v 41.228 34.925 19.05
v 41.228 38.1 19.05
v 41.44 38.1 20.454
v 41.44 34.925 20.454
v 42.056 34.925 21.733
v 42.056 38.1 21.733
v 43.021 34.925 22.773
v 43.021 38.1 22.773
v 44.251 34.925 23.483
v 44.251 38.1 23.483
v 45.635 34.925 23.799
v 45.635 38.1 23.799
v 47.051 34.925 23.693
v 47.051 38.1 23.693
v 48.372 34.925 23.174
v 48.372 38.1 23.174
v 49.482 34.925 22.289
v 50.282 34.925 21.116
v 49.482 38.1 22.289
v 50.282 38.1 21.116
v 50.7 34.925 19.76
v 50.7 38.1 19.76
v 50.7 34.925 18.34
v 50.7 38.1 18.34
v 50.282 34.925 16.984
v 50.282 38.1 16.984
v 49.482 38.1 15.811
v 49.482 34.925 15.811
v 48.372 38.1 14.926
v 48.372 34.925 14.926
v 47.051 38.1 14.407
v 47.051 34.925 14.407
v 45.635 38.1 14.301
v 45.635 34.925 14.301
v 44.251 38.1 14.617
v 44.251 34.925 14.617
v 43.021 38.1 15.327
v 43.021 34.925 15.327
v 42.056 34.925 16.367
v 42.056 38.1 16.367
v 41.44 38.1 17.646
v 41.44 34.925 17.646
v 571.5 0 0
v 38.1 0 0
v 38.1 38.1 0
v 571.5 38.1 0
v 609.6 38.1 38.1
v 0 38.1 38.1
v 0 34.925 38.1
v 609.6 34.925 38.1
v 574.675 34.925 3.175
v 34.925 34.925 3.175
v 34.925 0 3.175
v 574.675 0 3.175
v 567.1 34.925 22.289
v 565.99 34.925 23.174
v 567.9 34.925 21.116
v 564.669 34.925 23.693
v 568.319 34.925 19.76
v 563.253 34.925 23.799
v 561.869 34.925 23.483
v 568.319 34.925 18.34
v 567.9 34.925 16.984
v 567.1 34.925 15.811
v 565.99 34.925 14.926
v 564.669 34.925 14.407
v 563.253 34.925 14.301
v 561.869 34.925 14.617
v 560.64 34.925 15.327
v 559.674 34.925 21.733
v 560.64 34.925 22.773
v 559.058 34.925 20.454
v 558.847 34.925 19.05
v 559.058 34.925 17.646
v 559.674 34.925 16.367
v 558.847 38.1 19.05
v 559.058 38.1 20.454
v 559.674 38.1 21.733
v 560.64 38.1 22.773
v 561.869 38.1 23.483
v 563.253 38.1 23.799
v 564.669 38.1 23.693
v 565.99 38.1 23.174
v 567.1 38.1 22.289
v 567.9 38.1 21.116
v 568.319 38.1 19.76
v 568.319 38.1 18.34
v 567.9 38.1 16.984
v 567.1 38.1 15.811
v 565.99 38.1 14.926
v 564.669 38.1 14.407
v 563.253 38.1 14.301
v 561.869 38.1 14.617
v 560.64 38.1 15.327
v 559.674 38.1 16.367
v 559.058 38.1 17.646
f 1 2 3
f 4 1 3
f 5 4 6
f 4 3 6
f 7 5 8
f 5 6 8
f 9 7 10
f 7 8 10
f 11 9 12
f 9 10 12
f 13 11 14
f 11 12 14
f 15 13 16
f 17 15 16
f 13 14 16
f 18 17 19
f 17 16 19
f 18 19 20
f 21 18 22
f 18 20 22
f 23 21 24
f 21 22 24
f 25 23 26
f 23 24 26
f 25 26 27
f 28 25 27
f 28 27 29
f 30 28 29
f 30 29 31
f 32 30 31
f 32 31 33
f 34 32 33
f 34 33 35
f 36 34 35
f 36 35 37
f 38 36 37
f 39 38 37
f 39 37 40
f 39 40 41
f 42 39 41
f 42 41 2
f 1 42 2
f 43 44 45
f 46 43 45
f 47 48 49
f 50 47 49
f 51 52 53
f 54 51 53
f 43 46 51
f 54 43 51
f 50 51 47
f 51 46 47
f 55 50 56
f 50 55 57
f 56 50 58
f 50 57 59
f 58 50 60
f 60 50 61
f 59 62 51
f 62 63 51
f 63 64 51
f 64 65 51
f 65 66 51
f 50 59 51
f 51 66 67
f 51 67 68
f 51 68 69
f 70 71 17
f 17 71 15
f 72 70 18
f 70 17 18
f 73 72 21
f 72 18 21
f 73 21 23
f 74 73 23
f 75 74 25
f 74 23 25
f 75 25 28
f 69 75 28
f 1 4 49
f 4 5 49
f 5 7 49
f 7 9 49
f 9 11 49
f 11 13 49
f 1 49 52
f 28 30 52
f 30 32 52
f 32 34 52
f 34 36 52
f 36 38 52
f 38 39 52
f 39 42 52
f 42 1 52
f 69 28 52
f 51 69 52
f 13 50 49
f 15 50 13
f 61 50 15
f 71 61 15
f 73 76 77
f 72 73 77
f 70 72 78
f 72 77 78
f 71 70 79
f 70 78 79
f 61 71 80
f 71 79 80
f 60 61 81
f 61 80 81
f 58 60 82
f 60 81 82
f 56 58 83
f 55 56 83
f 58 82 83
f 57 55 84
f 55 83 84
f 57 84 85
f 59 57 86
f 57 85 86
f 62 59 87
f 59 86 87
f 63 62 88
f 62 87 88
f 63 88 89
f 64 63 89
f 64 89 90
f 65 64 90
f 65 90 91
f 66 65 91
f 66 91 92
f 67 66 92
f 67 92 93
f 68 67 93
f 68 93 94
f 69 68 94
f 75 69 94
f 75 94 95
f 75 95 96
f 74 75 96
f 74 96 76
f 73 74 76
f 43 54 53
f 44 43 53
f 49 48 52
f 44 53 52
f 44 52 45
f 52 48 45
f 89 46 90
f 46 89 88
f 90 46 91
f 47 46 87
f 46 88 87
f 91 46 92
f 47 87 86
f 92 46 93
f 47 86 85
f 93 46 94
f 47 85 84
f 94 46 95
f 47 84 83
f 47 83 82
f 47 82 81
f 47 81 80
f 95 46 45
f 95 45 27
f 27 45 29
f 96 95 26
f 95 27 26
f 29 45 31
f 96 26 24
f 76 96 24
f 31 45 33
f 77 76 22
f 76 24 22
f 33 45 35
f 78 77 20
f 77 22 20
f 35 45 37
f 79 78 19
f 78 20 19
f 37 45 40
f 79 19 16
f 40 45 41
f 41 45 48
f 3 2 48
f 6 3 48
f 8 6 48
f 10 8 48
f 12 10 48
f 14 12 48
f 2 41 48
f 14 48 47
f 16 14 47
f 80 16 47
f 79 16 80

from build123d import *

# Parameters (mm, degrees)
F1_DEPTH = 609.6
F3_DEPTH = 38.101
F4_R     = 4.7625
F5_DEPTH = 38.101


with BuildPart() as f1:
    # F0 (on Right) → F1 (new body)
    with BuildSketch(Plane.YZ):
        Polygon((0, 3.175), (0, 0), (38.1, 0), (38.1, 38.1), (34.925, 38.1), (34.925, 3.175), align=None)
    extrude(amount=F1_DEPTH)

    # F2 (on face) → F3 (cut, through all)
    with BuildSketch(Plane(origin=(0, 38.1, 0), x_dir=(-1, 0, 0), z_dir=(0, 1, 0))):
        Polygon((-571.5, 0), (-609.6, 38.1), (-609.6, 0), align=None)
        Polygon((0, 0), (0, 38.1), (-38.1, 0), align=None)
    extrude(amount=-F3_DEPTH, mode=Mode.SUBTRACT)

    # F4 (on face) → F5 (cut, through all)
    with BuildSketch(Plane(origin=(0, 38.1, 0), x_dir=(-1, 0, 0), z_dir=(0, 1, 0))):
        with Locations((-45.990768, 19.05)):
            Circle(F4_R)
        with Locations((-563.609232, 19.05)):
            Circle(F4_R)
    extrude(amount=-F5_DEPTH, mode=Mode.SUBTRACT)


solid = f1.part
